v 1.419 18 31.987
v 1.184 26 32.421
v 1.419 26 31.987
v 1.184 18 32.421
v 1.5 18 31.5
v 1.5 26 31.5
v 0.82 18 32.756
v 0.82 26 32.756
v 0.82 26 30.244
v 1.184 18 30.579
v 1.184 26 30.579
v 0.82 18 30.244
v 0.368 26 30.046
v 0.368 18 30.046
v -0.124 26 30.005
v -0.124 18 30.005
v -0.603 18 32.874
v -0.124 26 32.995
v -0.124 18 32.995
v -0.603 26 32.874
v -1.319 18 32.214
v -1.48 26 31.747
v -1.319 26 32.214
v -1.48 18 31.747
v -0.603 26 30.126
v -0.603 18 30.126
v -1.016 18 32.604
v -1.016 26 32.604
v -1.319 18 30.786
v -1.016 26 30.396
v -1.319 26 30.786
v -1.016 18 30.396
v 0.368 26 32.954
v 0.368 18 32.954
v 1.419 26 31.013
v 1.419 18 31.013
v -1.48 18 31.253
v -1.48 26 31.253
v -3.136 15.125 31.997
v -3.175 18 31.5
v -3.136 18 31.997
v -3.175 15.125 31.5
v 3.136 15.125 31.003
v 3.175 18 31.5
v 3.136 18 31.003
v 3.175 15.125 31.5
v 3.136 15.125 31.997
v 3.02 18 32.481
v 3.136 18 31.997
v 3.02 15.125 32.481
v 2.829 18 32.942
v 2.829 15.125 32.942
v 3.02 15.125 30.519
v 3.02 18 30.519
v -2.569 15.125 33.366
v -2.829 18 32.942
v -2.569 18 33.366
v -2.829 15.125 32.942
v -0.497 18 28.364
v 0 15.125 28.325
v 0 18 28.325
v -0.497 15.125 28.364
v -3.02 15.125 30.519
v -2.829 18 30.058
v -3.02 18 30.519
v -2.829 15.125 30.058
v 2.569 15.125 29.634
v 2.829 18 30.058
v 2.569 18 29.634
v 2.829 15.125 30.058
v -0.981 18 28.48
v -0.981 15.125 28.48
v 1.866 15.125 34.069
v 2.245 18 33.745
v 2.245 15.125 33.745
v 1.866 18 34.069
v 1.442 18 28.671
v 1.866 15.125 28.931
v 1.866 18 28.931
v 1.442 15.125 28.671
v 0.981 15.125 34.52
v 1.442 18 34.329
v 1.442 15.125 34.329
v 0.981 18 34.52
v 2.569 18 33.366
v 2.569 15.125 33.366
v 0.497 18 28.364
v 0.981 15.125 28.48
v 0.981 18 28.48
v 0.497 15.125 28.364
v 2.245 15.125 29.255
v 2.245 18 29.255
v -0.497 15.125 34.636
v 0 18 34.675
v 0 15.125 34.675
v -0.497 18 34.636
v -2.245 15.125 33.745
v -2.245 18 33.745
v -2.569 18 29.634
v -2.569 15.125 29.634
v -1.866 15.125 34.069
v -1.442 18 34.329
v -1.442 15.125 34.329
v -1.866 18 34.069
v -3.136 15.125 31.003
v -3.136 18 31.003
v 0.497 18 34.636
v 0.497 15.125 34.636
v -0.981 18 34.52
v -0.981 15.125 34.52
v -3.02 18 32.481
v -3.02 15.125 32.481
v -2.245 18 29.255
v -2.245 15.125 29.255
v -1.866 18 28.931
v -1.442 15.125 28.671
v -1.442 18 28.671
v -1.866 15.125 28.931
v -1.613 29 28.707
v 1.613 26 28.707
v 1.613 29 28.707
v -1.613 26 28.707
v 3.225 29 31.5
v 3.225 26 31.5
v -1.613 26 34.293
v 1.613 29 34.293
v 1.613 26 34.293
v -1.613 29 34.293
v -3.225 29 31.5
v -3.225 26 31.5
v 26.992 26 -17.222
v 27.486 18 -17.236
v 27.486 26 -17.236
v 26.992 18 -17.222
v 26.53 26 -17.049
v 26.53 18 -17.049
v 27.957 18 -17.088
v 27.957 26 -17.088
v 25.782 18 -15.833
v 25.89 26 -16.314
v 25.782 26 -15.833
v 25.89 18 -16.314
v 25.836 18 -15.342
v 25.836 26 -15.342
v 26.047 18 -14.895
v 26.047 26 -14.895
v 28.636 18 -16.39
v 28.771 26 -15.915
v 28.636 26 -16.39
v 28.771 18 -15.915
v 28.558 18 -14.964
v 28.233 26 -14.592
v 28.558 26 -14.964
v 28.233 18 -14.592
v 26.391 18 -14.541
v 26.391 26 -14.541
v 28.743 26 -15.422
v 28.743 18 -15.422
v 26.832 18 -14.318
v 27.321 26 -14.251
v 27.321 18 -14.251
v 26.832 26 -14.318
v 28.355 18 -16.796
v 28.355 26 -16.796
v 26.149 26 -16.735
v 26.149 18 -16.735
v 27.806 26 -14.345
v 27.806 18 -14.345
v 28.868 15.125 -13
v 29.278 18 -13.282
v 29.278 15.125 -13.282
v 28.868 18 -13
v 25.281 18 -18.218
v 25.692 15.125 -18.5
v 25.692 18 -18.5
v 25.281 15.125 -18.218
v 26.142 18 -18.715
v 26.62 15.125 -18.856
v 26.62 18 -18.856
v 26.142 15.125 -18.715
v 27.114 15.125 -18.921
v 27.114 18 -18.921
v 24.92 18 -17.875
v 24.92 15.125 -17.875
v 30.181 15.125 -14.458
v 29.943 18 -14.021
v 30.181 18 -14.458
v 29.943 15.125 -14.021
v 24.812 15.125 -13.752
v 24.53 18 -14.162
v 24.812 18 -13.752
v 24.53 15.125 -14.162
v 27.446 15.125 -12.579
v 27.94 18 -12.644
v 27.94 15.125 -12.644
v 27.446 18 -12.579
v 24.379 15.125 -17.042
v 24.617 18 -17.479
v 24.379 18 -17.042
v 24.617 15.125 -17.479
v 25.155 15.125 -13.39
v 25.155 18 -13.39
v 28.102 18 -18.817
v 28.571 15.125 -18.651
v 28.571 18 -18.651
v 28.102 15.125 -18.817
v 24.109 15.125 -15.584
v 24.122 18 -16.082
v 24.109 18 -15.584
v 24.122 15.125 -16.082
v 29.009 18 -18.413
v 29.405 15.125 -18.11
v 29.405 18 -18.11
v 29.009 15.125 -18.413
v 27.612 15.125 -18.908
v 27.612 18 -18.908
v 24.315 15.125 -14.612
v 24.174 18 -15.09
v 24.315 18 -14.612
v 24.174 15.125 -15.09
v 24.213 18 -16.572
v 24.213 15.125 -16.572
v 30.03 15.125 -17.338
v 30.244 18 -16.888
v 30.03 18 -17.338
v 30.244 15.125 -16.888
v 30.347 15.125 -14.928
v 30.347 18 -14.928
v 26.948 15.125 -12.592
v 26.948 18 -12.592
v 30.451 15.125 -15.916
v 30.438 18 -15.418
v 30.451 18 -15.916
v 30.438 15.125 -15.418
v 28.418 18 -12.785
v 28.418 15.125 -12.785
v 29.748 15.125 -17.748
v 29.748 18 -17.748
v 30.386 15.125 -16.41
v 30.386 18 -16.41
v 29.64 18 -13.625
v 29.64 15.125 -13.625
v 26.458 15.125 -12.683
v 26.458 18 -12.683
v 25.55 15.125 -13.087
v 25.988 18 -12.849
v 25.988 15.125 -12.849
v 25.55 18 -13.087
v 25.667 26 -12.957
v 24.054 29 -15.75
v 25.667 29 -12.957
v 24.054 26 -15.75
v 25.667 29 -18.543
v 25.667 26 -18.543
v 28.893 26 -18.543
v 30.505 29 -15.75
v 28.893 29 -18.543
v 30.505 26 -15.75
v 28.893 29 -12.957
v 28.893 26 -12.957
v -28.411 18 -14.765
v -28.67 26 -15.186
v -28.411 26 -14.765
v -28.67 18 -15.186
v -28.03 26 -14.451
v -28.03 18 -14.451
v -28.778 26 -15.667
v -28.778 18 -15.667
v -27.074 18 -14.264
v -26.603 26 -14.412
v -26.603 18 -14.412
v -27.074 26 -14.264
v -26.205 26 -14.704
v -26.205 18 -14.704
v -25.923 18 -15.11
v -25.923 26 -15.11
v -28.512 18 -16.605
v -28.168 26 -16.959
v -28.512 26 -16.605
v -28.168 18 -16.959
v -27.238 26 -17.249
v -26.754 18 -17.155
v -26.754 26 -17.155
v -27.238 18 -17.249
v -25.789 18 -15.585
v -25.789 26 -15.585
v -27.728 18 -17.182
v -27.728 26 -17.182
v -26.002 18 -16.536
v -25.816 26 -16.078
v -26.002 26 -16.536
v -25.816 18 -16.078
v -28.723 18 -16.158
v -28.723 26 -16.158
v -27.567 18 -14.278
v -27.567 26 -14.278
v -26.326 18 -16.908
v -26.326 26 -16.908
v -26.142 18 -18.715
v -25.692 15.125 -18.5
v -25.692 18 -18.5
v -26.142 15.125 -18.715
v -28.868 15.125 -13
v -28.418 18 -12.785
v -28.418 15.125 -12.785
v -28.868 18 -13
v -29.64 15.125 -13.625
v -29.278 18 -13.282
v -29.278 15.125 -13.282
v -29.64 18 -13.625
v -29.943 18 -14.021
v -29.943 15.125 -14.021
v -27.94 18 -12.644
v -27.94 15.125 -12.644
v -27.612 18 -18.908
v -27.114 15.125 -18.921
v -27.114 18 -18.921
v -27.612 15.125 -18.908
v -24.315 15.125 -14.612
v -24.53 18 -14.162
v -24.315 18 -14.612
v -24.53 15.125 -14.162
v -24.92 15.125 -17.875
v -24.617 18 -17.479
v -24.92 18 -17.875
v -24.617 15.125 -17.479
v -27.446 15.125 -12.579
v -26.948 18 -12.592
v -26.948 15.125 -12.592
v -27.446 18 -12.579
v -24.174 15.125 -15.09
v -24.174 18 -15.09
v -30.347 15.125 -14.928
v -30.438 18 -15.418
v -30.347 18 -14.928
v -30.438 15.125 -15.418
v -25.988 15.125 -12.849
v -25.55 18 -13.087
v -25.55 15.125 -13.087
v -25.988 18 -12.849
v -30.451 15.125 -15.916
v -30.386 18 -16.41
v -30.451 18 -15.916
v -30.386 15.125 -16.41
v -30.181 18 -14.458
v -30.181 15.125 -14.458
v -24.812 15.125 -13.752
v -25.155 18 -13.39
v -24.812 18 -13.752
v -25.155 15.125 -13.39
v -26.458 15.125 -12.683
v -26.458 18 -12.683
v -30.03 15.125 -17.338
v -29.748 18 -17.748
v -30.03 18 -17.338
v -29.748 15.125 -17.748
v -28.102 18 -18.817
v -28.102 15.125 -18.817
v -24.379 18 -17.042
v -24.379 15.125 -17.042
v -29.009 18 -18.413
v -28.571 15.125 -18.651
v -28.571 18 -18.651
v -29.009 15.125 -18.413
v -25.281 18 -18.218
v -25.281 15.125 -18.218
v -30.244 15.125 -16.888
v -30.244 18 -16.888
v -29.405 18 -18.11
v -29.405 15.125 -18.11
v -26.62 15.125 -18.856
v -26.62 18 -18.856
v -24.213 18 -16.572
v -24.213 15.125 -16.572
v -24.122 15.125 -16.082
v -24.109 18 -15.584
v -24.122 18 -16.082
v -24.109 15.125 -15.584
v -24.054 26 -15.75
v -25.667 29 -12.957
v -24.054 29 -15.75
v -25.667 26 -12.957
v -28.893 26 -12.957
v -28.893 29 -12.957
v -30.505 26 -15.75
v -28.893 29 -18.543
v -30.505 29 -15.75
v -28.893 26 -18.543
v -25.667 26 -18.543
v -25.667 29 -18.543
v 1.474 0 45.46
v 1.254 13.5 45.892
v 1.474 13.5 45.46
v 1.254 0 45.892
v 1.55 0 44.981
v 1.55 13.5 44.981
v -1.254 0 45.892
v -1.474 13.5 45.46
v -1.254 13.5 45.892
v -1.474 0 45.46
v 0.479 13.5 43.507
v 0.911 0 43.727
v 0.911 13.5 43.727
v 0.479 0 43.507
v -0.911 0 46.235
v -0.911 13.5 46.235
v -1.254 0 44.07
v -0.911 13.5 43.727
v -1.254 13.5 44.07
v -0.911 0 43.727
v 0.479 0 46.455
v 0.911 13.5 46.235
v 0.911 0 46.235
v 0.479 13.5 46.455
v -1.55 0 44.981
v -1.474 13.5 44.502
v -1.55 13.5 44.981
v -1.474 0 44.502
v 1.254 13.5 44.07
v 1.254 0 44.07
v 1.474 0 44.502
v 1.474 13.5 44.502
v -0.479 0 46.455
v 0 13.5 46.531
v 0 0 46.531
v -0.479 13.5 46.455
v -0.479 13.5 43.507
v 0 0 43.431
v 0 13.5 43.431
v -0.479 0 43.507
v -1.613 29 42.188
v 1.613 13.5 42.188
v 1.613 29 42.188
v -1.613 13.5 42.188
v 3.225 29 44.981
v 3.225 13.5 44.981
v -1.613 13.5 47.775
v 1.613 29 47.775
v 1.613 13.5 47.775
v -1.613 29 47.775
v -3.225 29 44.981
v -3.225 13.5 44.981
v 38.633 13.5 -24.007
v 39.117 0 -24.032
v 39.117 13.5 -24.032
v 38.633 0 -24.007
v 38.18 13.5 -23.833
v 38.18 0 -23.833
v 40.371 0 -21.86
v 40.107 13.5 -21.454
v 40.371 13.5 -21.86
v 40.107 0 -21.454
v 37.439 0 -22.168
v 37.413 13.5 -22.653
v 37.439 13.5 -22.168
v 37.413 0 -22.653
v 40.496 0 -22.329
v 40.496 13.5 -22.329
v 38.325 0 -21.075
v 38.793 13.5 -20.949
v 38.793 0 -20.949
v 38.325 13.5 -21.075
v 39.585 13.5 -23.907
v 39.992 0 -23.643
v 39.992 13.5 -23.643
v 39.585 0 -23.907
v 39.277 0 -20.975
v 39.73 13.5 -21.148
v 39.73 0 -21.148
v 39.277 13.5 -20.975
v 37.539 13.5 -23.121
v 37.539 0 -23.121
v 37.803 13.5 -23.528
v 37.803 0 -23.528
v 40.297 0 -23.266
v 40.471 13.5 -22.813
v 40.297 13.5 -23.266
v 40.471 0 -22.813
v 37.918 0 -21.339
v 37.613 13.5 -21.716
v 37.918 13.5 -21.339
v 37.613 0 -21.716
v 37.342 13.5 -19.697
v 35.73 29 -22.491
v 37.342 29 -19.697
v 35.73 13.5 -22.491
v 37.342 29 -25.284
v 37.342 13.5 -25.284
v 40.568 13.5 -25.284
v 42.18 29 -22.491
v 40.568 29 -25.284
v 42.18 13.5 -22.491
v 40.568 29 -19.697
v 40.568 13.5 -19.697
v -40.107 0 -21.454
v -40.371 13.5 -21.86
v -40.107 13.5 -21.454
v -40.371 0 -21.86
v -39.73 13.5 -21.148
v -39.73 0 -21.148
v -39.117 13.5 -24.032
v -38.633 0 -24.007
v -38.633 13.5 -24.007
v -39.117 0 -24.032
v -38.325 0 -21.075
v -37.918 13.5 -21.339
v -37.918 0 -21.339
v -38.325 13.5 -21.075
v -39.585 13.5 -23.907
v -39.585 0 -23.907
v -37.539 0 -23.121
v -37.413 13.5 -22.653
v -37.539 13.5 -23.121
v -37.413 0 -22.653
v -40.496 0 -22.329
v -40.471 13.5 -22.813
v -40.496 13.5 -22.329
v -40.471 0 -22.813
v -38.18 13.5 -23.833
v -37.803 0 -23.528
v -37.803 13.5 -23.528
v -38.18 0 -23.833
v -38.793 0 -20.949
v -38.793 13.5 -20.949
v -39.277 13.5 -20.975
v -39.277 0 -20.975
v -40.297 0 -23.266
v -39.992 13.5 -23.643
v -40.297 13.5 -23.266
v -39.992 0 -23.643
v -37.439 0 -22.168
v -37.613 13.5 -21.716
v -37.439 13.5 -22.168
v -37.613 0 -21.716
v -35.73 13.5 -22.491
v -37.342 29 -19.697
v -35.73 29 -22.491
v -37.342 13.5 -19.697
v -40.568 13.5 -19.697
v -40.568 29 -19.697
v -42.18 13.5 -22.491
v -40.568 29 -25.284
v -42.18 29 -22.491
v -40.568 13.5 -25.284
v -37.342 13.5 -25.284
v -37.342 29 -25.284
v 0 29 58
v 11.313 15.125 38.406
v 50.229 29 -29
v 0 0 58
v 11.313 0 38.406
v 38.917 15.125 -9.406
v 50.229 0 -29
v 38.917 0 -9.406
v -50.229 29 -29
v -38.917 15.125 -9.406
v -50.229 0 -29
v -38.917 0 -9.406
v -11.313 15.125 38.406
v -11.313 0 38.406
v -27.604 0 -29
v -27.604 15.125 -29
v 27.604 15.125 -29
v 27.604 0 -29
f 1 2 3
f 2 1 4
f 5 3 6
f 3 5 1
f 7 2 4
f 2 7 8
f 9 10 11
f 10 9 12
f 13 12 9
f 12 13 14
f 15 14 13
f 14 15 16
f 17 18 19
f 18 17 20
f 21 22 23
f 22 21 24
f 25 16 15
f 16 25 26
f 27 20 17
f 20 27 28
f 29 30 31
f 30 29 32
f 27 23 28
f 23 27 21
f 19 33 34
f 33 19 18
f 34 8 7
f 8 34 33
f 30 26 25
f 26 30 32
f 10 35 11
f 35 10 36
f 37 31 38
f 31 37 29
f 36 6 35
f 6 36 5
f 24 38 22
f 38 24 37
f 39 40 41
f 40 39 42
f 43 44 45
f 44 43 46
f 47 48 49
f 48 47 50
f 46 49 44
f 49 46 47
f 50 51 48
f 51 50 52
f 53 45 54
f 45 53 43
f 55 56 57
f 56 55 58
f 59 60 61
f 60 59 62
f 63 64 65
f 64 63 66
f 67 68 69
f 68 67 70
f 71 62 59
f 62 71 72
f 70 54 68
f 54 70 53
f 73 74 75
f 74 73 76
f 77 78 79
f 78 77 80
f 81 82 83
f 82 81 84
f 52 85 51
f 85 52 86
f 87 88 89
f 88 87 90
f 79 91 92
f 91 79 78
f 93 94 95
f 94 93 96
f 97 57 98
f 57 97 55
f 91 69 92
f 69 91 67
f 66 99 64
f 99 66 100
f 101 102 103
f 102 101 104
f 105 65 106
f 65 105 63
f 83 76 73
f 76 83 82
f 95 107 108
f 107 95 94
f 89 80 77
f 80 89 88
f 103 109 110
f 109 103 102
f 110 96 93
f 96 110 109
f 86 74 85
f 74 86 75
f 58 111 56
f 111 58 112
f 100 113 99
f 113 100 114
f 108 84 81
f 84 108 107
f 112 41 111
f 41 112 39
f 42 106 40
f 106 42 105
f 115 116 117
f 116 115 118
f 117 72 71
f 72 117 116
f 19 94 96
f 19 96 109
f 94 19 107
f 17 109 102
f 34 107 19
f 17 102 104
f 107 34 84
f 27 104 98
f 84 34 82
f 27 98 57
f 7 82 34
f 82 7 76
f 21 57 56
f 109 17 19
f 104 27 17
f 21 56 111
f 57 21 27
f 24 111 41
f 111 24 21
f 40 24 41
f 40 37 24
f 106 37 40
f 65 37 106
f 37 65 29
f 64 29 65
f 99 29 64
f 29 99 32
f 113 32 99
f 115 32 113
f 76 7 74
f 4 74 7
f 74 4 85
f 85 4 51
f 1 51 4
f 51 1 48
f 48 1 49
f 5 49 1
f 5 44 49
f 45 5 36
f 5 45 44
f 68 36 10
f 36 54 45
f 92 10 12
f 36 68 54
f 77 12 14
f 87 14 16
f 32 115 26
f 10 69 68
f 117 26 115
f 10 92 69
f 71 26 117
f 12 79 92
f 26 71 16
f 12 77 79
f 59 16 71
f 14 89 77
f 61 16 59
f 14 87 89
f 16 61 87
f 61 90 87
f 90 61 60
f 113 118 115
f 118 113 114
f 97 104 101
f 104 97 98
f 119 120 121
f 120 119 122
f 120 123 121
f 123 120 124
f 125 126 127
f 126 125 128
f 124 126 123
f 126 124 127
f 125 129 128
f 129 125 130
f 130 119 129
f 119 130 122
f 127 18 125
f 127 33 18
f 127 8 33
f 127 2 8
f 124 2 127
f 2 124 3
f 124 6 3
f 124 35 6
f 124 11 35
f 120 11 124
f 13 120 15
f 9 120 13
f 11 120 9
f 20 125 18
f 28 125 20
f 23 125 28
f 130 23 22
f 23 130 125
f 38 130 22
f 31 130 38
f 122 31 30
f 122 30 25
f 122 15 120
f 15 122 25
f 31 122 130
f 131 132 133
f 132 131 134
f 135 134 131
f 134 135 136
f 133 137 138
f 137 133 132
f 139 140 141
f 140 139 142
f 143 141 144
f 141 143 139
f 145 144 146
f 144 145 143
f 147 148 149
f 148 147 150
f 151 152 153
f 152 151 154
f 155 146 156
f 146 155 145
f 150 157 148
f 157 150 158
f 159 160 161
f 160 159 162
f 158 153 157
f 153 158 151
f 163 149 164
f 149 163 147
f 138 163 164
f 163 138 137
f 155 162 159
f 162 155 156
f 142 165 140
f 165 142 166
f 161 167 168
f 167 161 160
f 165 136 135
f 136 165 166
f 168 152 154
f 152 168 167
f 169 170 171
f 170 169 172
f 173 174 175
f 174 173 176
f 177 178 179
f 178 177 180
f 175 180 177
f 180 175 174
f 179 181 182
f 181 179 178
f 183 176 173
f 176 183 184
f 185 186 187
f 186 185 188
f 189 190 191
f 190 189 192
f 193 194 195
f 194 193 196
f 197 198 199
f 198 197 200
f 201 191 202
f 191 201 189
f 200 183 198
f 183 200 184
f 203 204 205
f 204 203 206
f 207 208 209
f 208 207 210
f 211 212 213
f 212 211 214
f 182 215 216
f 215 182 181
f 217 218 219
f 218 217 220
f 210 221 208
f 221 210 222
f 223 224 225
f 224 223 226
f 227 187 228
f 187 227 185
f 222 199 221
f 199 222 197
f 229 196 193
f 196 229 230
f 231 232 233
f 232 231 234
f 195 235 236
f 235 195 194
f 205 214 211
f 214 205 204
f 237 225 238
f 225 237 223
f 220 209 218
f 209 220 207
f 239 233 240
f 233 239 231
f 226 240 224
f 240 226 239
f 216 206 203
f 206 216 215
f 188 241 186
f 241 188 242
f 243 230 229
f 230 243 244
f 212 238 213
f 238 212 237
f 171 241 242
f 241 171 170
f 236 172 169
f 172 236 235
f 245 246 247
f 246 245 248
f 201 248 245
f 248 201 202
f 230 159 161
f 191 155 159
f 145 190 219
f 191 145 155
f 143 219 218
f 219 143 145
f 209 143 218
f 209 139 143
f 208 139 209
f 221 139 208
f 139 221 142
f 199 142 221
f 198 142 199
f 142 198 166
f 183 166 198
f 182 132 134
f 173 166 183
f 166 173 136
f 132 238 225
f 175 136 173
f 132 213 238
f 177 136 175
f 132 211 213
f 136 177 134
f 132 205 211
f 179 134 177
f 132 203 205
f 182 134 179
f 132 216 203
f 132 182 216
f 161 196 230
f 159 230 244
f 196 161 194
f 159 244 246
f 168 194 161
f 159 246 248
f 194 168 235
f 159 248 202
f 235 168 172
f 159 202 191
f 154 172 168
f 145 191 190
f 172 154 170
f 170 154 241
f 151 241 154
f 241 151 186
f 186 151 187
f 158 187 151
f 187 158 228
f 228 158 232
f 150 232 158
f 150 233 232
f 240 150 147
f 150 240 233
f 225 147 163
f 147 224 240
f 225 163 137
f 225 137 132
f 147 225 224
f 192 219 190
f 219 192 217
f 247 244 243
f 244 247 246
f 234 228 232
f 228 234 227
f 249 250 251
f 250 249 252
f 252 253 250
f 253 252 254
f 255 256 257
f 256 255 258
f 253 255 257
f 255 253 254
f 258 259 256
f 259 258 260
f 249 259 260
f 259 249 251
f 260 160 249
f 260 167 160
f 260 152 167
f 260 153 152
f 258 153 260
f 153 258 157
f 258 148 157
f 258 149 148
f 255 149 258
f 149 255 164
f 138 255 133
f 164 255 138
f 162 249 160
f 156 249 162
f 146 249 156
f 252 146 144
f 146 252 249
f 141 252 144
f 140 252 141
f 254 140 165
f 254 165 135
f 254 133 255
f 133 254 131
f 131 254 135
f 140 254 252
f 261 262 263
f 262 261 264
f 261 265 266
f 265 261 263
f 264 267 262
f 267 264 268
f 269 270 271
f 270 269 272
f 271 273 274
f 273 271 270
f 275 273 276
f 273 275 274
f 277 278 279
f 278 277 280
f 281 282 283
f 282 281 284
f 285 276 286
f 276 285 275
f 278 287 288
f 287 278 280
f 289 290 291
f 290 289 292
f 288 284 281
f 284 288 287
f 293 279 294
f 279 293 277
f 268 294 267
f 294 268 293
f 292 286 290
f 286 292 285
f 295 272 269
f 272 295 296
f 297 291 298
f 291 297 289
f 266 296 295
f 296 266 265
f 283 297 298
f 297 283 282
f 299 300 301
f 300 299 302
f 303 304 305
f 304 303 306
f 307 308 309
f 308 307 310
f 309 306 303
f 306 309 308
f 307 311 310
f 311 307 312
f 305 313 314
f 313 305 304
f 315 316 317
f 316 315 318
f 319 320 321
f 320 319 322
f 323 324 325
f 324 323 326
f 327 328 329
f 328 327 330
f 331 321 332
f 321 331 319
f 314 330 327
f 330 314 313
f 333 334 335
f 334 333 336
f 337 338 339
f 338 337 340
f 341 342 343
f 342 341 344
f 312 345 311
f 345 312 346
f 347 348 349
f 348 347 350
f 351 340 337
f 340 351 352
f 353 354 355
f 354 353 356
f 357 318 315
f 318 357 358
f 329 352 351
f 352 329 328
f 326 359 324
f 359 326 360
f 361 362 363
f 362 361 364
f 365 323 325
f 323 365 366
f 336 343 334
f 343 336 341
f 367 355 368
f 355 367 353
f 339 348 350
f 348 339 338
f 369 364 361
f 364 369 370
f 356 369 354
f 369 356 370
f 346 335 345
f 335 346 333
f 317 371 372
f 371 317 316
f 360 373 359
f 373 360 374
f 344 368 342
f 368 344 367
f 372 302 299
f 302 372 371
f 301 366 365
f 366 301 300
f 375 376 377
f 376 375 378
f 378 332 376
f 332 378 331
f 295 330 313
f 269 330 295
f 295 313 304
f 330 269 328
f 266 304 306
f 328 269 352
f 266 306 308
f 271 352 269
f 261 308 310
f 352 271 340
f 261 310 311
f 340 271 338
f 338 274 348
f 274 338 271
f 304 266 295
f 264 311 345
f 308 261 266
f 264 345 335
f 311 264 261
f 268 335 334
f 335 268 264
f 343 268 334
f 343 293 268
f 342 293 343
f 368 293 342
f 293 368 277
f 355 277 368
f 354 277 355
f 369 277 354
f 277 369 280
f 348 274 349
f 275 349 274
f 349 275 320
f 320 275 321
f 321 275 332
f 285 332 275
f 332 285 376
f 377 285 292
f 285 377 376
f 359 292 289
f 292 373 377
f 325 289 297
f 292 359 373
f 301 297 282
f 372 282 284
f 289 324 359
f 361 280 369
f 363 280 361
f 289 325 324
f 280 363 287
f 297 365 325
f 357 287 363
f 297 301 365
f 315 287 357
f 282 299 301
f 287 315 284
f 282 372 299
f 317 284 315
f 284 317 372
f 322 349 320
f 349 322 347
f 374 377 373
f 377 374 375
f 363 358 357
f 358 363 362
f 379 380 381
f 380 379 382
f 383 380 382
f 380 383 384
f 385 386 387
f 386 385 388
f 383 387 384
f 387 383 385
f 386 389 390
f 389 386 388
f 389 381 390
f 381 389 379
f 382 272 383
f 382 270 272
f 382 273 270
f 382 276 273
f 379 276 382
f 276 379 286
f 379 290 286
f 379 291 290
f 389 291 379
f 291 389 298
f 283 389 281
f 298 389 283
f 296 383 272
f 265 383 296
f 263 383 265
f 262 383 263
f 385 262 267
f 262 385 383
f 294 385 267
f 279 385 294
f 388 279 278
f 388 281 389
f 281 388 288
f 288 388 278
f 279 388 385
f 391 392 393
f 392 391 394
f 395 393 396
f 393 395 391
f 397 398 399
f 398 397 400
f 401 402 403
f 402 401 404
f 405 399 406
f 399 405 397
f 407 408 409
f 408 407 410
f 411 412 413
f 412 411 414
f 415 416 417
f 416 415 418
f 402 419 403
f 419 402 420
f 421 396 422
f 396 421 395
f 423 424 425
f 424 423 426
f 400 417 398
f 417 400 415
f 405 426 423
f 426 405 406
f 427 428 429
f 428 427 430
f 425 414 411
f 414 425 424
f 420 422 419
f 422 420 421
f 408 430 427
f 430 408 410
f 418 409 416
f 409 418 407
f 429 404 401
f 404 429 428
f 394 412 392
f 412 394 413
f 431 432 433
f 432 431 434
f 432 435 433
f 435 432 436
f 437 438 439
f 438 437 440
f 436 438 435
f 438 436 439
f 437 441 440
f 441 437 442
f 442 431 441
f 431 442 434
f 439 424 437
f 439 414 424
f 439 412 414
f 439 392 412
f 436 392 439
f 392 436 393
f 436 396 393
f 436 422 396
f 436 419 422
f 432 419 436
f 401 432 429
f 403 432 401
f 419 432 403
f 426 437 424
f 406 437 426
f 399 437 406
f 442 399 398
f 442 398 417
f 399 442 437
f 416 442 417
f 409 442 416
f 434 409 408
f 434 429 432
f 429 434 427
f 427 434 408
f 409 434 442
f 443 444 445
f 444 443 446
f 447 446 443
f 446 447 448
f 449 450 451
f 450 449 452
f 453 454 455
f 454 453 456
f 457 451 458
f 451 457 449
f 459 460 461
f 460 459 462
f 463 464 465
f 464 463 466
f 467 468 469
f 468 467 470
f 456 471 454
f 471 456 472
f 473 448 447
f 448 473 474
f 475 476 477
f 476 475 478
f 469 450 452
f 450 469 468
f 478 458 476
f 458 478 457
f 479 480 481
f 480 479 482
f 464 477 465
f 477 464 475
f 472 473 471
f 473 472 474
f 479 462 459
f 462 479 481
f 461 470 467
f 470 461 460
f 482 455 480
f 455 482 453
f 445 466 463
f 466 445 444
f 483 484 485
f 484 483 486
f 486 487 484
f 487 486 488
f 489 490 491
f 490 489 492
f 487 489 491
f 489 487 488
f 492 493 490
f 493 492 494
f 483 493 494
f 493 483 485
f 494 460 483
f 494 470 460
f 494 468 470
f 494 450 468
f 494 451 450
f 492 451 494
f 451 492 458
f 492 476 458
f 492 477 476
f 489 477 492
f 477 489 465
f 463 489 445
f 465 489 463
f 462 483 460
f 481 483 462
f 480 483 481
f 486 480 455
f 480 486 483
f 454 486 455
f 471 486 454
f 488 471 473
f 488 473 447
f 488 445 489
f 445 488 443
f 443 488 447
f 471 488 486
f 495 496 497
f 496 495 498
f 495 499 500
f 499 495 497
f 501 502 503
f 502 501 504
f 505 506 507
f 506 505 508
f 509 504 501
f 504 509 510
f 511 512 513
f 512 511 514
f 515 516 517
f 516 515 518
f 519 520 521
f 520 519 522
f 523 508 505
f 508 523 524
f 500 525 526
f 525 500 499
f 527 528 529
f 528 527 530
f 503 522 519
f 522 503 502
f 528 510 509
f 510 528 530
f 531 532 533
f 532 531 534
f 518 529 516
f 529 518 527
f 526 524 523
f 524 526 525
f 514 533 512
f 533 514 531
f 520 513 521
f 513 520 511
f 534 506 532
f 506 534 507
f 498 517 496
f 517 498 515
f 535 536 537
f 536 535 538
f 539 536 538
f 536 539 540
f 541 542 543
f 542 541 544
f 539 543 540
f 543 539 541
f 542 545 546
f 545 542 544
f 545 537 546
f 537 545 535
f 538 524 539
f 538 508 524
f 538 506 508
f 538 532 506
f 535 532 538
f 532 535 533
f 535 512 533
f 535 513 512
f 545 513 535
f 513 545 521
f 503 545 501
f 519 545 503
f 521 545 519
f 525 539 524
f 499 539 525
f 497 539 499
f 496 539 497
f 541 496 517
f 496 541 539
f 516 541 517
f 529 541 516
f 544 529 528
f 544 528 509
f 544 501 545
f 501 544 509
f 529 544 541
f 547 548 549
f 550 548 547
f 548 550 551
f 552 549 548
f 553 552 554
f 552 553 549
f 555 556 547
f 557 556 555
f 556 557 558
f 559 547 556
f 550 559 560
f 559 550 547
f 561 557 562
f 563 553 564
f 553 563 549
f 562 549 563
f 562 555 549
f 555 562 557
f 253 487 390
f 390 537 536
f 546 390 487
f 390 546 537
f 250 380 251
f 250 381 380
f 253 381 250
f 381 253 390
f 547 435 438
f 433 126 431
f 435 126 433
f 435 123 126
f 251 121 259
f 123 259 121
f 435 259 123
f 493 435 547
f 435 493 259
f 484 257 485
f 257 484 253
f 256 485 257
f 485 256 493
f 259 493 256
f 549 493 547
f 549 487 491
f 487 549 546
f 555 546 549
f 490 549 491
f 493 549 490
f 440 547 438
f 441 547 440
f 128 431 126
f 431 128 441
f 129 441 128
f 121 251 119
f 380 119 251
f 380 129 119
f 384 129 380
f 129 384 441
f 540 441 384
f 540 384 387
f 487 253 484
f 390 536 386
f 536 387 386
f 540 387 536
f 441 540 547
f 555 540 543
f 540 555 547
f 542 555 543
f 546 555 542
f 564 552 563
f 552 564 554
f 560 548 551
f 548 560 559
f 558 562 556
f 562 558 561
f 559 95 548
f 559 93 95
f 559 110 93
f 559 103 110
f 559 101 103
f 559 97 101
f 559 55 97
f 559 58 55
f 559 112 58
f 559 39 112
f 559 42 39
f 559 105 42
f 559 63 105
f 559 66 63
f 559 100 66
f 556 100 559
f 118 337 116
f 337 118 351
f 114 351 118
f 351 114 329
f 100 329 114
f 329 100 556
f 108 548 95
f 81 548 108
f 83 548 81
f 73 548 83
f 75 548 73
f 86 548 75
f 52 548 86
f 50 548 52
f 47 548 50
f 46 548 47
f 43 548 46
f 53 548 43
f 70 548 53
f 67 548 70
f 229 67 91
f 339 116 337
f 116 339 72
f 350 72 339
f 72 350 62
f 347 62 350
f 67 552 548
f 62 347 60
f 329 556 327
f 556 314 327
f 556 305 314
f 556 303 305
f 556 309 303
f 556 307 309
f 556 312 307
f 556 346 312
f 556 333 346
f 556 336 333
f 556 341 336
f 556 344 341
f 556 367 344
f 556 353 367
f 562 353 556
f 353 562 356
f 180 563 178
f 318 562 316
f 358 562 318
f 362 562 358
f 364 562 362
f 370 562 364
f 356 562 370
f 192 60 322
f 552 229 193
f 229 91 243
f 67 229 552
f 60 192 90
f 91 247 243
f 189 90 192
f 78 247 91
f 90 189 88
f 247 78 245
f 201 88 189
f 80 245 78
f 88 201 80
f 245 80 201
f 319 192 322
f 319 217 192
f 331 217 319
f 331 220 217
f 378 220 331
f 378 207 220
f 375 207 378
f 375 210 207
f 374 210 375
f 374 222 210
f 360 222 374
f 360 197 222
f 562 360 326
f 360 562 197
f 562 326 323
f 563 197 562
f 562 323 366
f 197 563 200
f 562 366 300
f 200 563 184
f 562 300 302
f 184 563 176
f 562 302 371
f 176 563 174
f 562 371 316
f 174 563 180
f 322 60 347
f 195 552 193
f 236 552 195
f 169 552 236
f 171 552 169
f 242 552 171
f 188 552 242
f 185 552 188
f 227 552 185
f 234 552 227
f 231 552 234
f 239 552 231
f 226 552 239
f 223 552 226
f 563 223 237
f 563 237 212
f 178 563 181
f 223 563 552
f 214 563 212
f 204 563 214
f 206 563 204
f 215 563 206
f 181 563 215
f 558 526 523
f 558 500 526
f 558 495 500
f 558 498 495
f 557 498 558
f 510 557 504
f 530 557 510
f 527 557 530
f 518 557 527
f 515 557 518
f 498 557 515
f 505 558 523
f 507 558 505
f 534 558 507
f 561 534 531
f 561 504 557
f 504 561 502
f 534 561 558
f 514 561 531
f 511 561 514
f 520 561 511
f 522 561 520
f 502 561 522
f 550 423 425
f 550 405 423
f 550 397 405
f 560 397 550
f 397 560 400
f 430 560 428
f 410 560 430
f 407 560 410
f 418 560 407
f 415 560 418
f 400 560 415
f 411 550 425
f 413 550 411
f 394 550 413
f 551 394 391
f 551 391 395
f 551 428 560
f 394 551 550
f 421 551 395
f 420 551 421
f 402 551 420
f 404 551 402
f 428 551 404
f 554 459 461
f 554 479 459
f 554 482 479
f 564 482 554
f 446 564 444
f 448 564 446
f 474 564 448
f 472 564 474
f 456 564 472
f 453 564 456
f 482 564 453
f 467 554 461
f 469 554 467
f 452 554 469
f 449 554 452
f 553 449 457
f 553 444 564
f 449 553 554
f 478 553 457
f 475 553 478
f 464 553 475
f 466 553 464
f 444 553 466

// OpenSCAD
$fa=.01;
$fs=.5;


bearing_od = 8;
bearing_id = 3;
bearing_w=4;

threads_length = 18;
head_od=5.5;
head_h=3.2;


//nut_h = 2.3;
nut_h=3; // some extra space because overhangs
nut_waf=5.5;
nut_d=nut_waf/sin(360/6);

spacer_od=nut_d;
spacer_h=nut_h;

captive_od=55;
captive_w=30;

tight=.1;
loose=.25;

exmarg = 6;
w=captive_w+2*(threads_length-bearing_w);

echo(w);
module mirror2(xyz){
    mirror(xyz) children();
    children();
}

module captive(){
    rotate([90,0,0])cylinder(d=captive_od, h=captive_w, center=true);
}

module quadrate(){
    mirror2([0,1,0])
        for(i=[0:3]){
        rotate([0,45+i*90])
        translate([0,captive_w/2,captive_od/2+bearing_od/2])
        rotate([90,0,0])
        children();
    }
}
module trangate(r=captive_od/2+bearing_od/2, w_=captive_w){
    mirror2([0,1,0])
        for(i=[0:2]){
        rotate([0,i*120])
        translate([0,w_/2,r])
        rotate([90,0,0])
        mirror([0,0,1])
        children();
    }
}

//%trangate() cylinder(h=bearing_w, d=bearing_od, center=true);
module main(){
%captive();
    difference(){
        rotate([90,-90,0]) cylinder(d=captive_od*2+exmarg, h=w, $fn=3, center=true);
        //spool neg
        //rotate([90,0,0]) cylinder(h=captive_w+loose, d=captive_od+loose, center=true);
        rotate([90,90,0]) cylinder(d=captive_od*sqrt(7.5)+exmarg/2, h=captive_w+loose, $fn=3, center=true);
        //bearing neg
        #trangate() bearing_ass();

        %hull(){
            rotate([90,0,0]) cylinder(h=captive_w+loose, d=captive_od+loose, center=true);
            translate([0,0,-100])rotate([90,0,0]) cylinder(h=captive_w+loose, d=captive_od+loose, center=true);
        }
        #trangate( captive_od*sqrt(5/8)+exmarg/4, 0){
            cylinder(d=bearing_id+tight,h=w/2+.2, center=true);
            h=(30-nut_h)/2;
            translate([0,0,h]) cylinder(h=w/2-h+.2, d=nut_d+tight, $fn=6);
        }

        translate([0,-500,0]) cube(1000, center=true);
    }
}

module bearing_ass(){
    translate([0,0,-bearing_w]){
        cylinder(d=bearing_id,h=threads_length);
        cylinder(d=bearing_od, h=bearing_w);
        cylinder(d=spacer_od, h=bearing_w+spacer_h);
        translate([0,0,threads_length-nut_h]) cylinder(h=nut_h+.1, d=nut_d+tight, $fn=6);
    }
}

main();
